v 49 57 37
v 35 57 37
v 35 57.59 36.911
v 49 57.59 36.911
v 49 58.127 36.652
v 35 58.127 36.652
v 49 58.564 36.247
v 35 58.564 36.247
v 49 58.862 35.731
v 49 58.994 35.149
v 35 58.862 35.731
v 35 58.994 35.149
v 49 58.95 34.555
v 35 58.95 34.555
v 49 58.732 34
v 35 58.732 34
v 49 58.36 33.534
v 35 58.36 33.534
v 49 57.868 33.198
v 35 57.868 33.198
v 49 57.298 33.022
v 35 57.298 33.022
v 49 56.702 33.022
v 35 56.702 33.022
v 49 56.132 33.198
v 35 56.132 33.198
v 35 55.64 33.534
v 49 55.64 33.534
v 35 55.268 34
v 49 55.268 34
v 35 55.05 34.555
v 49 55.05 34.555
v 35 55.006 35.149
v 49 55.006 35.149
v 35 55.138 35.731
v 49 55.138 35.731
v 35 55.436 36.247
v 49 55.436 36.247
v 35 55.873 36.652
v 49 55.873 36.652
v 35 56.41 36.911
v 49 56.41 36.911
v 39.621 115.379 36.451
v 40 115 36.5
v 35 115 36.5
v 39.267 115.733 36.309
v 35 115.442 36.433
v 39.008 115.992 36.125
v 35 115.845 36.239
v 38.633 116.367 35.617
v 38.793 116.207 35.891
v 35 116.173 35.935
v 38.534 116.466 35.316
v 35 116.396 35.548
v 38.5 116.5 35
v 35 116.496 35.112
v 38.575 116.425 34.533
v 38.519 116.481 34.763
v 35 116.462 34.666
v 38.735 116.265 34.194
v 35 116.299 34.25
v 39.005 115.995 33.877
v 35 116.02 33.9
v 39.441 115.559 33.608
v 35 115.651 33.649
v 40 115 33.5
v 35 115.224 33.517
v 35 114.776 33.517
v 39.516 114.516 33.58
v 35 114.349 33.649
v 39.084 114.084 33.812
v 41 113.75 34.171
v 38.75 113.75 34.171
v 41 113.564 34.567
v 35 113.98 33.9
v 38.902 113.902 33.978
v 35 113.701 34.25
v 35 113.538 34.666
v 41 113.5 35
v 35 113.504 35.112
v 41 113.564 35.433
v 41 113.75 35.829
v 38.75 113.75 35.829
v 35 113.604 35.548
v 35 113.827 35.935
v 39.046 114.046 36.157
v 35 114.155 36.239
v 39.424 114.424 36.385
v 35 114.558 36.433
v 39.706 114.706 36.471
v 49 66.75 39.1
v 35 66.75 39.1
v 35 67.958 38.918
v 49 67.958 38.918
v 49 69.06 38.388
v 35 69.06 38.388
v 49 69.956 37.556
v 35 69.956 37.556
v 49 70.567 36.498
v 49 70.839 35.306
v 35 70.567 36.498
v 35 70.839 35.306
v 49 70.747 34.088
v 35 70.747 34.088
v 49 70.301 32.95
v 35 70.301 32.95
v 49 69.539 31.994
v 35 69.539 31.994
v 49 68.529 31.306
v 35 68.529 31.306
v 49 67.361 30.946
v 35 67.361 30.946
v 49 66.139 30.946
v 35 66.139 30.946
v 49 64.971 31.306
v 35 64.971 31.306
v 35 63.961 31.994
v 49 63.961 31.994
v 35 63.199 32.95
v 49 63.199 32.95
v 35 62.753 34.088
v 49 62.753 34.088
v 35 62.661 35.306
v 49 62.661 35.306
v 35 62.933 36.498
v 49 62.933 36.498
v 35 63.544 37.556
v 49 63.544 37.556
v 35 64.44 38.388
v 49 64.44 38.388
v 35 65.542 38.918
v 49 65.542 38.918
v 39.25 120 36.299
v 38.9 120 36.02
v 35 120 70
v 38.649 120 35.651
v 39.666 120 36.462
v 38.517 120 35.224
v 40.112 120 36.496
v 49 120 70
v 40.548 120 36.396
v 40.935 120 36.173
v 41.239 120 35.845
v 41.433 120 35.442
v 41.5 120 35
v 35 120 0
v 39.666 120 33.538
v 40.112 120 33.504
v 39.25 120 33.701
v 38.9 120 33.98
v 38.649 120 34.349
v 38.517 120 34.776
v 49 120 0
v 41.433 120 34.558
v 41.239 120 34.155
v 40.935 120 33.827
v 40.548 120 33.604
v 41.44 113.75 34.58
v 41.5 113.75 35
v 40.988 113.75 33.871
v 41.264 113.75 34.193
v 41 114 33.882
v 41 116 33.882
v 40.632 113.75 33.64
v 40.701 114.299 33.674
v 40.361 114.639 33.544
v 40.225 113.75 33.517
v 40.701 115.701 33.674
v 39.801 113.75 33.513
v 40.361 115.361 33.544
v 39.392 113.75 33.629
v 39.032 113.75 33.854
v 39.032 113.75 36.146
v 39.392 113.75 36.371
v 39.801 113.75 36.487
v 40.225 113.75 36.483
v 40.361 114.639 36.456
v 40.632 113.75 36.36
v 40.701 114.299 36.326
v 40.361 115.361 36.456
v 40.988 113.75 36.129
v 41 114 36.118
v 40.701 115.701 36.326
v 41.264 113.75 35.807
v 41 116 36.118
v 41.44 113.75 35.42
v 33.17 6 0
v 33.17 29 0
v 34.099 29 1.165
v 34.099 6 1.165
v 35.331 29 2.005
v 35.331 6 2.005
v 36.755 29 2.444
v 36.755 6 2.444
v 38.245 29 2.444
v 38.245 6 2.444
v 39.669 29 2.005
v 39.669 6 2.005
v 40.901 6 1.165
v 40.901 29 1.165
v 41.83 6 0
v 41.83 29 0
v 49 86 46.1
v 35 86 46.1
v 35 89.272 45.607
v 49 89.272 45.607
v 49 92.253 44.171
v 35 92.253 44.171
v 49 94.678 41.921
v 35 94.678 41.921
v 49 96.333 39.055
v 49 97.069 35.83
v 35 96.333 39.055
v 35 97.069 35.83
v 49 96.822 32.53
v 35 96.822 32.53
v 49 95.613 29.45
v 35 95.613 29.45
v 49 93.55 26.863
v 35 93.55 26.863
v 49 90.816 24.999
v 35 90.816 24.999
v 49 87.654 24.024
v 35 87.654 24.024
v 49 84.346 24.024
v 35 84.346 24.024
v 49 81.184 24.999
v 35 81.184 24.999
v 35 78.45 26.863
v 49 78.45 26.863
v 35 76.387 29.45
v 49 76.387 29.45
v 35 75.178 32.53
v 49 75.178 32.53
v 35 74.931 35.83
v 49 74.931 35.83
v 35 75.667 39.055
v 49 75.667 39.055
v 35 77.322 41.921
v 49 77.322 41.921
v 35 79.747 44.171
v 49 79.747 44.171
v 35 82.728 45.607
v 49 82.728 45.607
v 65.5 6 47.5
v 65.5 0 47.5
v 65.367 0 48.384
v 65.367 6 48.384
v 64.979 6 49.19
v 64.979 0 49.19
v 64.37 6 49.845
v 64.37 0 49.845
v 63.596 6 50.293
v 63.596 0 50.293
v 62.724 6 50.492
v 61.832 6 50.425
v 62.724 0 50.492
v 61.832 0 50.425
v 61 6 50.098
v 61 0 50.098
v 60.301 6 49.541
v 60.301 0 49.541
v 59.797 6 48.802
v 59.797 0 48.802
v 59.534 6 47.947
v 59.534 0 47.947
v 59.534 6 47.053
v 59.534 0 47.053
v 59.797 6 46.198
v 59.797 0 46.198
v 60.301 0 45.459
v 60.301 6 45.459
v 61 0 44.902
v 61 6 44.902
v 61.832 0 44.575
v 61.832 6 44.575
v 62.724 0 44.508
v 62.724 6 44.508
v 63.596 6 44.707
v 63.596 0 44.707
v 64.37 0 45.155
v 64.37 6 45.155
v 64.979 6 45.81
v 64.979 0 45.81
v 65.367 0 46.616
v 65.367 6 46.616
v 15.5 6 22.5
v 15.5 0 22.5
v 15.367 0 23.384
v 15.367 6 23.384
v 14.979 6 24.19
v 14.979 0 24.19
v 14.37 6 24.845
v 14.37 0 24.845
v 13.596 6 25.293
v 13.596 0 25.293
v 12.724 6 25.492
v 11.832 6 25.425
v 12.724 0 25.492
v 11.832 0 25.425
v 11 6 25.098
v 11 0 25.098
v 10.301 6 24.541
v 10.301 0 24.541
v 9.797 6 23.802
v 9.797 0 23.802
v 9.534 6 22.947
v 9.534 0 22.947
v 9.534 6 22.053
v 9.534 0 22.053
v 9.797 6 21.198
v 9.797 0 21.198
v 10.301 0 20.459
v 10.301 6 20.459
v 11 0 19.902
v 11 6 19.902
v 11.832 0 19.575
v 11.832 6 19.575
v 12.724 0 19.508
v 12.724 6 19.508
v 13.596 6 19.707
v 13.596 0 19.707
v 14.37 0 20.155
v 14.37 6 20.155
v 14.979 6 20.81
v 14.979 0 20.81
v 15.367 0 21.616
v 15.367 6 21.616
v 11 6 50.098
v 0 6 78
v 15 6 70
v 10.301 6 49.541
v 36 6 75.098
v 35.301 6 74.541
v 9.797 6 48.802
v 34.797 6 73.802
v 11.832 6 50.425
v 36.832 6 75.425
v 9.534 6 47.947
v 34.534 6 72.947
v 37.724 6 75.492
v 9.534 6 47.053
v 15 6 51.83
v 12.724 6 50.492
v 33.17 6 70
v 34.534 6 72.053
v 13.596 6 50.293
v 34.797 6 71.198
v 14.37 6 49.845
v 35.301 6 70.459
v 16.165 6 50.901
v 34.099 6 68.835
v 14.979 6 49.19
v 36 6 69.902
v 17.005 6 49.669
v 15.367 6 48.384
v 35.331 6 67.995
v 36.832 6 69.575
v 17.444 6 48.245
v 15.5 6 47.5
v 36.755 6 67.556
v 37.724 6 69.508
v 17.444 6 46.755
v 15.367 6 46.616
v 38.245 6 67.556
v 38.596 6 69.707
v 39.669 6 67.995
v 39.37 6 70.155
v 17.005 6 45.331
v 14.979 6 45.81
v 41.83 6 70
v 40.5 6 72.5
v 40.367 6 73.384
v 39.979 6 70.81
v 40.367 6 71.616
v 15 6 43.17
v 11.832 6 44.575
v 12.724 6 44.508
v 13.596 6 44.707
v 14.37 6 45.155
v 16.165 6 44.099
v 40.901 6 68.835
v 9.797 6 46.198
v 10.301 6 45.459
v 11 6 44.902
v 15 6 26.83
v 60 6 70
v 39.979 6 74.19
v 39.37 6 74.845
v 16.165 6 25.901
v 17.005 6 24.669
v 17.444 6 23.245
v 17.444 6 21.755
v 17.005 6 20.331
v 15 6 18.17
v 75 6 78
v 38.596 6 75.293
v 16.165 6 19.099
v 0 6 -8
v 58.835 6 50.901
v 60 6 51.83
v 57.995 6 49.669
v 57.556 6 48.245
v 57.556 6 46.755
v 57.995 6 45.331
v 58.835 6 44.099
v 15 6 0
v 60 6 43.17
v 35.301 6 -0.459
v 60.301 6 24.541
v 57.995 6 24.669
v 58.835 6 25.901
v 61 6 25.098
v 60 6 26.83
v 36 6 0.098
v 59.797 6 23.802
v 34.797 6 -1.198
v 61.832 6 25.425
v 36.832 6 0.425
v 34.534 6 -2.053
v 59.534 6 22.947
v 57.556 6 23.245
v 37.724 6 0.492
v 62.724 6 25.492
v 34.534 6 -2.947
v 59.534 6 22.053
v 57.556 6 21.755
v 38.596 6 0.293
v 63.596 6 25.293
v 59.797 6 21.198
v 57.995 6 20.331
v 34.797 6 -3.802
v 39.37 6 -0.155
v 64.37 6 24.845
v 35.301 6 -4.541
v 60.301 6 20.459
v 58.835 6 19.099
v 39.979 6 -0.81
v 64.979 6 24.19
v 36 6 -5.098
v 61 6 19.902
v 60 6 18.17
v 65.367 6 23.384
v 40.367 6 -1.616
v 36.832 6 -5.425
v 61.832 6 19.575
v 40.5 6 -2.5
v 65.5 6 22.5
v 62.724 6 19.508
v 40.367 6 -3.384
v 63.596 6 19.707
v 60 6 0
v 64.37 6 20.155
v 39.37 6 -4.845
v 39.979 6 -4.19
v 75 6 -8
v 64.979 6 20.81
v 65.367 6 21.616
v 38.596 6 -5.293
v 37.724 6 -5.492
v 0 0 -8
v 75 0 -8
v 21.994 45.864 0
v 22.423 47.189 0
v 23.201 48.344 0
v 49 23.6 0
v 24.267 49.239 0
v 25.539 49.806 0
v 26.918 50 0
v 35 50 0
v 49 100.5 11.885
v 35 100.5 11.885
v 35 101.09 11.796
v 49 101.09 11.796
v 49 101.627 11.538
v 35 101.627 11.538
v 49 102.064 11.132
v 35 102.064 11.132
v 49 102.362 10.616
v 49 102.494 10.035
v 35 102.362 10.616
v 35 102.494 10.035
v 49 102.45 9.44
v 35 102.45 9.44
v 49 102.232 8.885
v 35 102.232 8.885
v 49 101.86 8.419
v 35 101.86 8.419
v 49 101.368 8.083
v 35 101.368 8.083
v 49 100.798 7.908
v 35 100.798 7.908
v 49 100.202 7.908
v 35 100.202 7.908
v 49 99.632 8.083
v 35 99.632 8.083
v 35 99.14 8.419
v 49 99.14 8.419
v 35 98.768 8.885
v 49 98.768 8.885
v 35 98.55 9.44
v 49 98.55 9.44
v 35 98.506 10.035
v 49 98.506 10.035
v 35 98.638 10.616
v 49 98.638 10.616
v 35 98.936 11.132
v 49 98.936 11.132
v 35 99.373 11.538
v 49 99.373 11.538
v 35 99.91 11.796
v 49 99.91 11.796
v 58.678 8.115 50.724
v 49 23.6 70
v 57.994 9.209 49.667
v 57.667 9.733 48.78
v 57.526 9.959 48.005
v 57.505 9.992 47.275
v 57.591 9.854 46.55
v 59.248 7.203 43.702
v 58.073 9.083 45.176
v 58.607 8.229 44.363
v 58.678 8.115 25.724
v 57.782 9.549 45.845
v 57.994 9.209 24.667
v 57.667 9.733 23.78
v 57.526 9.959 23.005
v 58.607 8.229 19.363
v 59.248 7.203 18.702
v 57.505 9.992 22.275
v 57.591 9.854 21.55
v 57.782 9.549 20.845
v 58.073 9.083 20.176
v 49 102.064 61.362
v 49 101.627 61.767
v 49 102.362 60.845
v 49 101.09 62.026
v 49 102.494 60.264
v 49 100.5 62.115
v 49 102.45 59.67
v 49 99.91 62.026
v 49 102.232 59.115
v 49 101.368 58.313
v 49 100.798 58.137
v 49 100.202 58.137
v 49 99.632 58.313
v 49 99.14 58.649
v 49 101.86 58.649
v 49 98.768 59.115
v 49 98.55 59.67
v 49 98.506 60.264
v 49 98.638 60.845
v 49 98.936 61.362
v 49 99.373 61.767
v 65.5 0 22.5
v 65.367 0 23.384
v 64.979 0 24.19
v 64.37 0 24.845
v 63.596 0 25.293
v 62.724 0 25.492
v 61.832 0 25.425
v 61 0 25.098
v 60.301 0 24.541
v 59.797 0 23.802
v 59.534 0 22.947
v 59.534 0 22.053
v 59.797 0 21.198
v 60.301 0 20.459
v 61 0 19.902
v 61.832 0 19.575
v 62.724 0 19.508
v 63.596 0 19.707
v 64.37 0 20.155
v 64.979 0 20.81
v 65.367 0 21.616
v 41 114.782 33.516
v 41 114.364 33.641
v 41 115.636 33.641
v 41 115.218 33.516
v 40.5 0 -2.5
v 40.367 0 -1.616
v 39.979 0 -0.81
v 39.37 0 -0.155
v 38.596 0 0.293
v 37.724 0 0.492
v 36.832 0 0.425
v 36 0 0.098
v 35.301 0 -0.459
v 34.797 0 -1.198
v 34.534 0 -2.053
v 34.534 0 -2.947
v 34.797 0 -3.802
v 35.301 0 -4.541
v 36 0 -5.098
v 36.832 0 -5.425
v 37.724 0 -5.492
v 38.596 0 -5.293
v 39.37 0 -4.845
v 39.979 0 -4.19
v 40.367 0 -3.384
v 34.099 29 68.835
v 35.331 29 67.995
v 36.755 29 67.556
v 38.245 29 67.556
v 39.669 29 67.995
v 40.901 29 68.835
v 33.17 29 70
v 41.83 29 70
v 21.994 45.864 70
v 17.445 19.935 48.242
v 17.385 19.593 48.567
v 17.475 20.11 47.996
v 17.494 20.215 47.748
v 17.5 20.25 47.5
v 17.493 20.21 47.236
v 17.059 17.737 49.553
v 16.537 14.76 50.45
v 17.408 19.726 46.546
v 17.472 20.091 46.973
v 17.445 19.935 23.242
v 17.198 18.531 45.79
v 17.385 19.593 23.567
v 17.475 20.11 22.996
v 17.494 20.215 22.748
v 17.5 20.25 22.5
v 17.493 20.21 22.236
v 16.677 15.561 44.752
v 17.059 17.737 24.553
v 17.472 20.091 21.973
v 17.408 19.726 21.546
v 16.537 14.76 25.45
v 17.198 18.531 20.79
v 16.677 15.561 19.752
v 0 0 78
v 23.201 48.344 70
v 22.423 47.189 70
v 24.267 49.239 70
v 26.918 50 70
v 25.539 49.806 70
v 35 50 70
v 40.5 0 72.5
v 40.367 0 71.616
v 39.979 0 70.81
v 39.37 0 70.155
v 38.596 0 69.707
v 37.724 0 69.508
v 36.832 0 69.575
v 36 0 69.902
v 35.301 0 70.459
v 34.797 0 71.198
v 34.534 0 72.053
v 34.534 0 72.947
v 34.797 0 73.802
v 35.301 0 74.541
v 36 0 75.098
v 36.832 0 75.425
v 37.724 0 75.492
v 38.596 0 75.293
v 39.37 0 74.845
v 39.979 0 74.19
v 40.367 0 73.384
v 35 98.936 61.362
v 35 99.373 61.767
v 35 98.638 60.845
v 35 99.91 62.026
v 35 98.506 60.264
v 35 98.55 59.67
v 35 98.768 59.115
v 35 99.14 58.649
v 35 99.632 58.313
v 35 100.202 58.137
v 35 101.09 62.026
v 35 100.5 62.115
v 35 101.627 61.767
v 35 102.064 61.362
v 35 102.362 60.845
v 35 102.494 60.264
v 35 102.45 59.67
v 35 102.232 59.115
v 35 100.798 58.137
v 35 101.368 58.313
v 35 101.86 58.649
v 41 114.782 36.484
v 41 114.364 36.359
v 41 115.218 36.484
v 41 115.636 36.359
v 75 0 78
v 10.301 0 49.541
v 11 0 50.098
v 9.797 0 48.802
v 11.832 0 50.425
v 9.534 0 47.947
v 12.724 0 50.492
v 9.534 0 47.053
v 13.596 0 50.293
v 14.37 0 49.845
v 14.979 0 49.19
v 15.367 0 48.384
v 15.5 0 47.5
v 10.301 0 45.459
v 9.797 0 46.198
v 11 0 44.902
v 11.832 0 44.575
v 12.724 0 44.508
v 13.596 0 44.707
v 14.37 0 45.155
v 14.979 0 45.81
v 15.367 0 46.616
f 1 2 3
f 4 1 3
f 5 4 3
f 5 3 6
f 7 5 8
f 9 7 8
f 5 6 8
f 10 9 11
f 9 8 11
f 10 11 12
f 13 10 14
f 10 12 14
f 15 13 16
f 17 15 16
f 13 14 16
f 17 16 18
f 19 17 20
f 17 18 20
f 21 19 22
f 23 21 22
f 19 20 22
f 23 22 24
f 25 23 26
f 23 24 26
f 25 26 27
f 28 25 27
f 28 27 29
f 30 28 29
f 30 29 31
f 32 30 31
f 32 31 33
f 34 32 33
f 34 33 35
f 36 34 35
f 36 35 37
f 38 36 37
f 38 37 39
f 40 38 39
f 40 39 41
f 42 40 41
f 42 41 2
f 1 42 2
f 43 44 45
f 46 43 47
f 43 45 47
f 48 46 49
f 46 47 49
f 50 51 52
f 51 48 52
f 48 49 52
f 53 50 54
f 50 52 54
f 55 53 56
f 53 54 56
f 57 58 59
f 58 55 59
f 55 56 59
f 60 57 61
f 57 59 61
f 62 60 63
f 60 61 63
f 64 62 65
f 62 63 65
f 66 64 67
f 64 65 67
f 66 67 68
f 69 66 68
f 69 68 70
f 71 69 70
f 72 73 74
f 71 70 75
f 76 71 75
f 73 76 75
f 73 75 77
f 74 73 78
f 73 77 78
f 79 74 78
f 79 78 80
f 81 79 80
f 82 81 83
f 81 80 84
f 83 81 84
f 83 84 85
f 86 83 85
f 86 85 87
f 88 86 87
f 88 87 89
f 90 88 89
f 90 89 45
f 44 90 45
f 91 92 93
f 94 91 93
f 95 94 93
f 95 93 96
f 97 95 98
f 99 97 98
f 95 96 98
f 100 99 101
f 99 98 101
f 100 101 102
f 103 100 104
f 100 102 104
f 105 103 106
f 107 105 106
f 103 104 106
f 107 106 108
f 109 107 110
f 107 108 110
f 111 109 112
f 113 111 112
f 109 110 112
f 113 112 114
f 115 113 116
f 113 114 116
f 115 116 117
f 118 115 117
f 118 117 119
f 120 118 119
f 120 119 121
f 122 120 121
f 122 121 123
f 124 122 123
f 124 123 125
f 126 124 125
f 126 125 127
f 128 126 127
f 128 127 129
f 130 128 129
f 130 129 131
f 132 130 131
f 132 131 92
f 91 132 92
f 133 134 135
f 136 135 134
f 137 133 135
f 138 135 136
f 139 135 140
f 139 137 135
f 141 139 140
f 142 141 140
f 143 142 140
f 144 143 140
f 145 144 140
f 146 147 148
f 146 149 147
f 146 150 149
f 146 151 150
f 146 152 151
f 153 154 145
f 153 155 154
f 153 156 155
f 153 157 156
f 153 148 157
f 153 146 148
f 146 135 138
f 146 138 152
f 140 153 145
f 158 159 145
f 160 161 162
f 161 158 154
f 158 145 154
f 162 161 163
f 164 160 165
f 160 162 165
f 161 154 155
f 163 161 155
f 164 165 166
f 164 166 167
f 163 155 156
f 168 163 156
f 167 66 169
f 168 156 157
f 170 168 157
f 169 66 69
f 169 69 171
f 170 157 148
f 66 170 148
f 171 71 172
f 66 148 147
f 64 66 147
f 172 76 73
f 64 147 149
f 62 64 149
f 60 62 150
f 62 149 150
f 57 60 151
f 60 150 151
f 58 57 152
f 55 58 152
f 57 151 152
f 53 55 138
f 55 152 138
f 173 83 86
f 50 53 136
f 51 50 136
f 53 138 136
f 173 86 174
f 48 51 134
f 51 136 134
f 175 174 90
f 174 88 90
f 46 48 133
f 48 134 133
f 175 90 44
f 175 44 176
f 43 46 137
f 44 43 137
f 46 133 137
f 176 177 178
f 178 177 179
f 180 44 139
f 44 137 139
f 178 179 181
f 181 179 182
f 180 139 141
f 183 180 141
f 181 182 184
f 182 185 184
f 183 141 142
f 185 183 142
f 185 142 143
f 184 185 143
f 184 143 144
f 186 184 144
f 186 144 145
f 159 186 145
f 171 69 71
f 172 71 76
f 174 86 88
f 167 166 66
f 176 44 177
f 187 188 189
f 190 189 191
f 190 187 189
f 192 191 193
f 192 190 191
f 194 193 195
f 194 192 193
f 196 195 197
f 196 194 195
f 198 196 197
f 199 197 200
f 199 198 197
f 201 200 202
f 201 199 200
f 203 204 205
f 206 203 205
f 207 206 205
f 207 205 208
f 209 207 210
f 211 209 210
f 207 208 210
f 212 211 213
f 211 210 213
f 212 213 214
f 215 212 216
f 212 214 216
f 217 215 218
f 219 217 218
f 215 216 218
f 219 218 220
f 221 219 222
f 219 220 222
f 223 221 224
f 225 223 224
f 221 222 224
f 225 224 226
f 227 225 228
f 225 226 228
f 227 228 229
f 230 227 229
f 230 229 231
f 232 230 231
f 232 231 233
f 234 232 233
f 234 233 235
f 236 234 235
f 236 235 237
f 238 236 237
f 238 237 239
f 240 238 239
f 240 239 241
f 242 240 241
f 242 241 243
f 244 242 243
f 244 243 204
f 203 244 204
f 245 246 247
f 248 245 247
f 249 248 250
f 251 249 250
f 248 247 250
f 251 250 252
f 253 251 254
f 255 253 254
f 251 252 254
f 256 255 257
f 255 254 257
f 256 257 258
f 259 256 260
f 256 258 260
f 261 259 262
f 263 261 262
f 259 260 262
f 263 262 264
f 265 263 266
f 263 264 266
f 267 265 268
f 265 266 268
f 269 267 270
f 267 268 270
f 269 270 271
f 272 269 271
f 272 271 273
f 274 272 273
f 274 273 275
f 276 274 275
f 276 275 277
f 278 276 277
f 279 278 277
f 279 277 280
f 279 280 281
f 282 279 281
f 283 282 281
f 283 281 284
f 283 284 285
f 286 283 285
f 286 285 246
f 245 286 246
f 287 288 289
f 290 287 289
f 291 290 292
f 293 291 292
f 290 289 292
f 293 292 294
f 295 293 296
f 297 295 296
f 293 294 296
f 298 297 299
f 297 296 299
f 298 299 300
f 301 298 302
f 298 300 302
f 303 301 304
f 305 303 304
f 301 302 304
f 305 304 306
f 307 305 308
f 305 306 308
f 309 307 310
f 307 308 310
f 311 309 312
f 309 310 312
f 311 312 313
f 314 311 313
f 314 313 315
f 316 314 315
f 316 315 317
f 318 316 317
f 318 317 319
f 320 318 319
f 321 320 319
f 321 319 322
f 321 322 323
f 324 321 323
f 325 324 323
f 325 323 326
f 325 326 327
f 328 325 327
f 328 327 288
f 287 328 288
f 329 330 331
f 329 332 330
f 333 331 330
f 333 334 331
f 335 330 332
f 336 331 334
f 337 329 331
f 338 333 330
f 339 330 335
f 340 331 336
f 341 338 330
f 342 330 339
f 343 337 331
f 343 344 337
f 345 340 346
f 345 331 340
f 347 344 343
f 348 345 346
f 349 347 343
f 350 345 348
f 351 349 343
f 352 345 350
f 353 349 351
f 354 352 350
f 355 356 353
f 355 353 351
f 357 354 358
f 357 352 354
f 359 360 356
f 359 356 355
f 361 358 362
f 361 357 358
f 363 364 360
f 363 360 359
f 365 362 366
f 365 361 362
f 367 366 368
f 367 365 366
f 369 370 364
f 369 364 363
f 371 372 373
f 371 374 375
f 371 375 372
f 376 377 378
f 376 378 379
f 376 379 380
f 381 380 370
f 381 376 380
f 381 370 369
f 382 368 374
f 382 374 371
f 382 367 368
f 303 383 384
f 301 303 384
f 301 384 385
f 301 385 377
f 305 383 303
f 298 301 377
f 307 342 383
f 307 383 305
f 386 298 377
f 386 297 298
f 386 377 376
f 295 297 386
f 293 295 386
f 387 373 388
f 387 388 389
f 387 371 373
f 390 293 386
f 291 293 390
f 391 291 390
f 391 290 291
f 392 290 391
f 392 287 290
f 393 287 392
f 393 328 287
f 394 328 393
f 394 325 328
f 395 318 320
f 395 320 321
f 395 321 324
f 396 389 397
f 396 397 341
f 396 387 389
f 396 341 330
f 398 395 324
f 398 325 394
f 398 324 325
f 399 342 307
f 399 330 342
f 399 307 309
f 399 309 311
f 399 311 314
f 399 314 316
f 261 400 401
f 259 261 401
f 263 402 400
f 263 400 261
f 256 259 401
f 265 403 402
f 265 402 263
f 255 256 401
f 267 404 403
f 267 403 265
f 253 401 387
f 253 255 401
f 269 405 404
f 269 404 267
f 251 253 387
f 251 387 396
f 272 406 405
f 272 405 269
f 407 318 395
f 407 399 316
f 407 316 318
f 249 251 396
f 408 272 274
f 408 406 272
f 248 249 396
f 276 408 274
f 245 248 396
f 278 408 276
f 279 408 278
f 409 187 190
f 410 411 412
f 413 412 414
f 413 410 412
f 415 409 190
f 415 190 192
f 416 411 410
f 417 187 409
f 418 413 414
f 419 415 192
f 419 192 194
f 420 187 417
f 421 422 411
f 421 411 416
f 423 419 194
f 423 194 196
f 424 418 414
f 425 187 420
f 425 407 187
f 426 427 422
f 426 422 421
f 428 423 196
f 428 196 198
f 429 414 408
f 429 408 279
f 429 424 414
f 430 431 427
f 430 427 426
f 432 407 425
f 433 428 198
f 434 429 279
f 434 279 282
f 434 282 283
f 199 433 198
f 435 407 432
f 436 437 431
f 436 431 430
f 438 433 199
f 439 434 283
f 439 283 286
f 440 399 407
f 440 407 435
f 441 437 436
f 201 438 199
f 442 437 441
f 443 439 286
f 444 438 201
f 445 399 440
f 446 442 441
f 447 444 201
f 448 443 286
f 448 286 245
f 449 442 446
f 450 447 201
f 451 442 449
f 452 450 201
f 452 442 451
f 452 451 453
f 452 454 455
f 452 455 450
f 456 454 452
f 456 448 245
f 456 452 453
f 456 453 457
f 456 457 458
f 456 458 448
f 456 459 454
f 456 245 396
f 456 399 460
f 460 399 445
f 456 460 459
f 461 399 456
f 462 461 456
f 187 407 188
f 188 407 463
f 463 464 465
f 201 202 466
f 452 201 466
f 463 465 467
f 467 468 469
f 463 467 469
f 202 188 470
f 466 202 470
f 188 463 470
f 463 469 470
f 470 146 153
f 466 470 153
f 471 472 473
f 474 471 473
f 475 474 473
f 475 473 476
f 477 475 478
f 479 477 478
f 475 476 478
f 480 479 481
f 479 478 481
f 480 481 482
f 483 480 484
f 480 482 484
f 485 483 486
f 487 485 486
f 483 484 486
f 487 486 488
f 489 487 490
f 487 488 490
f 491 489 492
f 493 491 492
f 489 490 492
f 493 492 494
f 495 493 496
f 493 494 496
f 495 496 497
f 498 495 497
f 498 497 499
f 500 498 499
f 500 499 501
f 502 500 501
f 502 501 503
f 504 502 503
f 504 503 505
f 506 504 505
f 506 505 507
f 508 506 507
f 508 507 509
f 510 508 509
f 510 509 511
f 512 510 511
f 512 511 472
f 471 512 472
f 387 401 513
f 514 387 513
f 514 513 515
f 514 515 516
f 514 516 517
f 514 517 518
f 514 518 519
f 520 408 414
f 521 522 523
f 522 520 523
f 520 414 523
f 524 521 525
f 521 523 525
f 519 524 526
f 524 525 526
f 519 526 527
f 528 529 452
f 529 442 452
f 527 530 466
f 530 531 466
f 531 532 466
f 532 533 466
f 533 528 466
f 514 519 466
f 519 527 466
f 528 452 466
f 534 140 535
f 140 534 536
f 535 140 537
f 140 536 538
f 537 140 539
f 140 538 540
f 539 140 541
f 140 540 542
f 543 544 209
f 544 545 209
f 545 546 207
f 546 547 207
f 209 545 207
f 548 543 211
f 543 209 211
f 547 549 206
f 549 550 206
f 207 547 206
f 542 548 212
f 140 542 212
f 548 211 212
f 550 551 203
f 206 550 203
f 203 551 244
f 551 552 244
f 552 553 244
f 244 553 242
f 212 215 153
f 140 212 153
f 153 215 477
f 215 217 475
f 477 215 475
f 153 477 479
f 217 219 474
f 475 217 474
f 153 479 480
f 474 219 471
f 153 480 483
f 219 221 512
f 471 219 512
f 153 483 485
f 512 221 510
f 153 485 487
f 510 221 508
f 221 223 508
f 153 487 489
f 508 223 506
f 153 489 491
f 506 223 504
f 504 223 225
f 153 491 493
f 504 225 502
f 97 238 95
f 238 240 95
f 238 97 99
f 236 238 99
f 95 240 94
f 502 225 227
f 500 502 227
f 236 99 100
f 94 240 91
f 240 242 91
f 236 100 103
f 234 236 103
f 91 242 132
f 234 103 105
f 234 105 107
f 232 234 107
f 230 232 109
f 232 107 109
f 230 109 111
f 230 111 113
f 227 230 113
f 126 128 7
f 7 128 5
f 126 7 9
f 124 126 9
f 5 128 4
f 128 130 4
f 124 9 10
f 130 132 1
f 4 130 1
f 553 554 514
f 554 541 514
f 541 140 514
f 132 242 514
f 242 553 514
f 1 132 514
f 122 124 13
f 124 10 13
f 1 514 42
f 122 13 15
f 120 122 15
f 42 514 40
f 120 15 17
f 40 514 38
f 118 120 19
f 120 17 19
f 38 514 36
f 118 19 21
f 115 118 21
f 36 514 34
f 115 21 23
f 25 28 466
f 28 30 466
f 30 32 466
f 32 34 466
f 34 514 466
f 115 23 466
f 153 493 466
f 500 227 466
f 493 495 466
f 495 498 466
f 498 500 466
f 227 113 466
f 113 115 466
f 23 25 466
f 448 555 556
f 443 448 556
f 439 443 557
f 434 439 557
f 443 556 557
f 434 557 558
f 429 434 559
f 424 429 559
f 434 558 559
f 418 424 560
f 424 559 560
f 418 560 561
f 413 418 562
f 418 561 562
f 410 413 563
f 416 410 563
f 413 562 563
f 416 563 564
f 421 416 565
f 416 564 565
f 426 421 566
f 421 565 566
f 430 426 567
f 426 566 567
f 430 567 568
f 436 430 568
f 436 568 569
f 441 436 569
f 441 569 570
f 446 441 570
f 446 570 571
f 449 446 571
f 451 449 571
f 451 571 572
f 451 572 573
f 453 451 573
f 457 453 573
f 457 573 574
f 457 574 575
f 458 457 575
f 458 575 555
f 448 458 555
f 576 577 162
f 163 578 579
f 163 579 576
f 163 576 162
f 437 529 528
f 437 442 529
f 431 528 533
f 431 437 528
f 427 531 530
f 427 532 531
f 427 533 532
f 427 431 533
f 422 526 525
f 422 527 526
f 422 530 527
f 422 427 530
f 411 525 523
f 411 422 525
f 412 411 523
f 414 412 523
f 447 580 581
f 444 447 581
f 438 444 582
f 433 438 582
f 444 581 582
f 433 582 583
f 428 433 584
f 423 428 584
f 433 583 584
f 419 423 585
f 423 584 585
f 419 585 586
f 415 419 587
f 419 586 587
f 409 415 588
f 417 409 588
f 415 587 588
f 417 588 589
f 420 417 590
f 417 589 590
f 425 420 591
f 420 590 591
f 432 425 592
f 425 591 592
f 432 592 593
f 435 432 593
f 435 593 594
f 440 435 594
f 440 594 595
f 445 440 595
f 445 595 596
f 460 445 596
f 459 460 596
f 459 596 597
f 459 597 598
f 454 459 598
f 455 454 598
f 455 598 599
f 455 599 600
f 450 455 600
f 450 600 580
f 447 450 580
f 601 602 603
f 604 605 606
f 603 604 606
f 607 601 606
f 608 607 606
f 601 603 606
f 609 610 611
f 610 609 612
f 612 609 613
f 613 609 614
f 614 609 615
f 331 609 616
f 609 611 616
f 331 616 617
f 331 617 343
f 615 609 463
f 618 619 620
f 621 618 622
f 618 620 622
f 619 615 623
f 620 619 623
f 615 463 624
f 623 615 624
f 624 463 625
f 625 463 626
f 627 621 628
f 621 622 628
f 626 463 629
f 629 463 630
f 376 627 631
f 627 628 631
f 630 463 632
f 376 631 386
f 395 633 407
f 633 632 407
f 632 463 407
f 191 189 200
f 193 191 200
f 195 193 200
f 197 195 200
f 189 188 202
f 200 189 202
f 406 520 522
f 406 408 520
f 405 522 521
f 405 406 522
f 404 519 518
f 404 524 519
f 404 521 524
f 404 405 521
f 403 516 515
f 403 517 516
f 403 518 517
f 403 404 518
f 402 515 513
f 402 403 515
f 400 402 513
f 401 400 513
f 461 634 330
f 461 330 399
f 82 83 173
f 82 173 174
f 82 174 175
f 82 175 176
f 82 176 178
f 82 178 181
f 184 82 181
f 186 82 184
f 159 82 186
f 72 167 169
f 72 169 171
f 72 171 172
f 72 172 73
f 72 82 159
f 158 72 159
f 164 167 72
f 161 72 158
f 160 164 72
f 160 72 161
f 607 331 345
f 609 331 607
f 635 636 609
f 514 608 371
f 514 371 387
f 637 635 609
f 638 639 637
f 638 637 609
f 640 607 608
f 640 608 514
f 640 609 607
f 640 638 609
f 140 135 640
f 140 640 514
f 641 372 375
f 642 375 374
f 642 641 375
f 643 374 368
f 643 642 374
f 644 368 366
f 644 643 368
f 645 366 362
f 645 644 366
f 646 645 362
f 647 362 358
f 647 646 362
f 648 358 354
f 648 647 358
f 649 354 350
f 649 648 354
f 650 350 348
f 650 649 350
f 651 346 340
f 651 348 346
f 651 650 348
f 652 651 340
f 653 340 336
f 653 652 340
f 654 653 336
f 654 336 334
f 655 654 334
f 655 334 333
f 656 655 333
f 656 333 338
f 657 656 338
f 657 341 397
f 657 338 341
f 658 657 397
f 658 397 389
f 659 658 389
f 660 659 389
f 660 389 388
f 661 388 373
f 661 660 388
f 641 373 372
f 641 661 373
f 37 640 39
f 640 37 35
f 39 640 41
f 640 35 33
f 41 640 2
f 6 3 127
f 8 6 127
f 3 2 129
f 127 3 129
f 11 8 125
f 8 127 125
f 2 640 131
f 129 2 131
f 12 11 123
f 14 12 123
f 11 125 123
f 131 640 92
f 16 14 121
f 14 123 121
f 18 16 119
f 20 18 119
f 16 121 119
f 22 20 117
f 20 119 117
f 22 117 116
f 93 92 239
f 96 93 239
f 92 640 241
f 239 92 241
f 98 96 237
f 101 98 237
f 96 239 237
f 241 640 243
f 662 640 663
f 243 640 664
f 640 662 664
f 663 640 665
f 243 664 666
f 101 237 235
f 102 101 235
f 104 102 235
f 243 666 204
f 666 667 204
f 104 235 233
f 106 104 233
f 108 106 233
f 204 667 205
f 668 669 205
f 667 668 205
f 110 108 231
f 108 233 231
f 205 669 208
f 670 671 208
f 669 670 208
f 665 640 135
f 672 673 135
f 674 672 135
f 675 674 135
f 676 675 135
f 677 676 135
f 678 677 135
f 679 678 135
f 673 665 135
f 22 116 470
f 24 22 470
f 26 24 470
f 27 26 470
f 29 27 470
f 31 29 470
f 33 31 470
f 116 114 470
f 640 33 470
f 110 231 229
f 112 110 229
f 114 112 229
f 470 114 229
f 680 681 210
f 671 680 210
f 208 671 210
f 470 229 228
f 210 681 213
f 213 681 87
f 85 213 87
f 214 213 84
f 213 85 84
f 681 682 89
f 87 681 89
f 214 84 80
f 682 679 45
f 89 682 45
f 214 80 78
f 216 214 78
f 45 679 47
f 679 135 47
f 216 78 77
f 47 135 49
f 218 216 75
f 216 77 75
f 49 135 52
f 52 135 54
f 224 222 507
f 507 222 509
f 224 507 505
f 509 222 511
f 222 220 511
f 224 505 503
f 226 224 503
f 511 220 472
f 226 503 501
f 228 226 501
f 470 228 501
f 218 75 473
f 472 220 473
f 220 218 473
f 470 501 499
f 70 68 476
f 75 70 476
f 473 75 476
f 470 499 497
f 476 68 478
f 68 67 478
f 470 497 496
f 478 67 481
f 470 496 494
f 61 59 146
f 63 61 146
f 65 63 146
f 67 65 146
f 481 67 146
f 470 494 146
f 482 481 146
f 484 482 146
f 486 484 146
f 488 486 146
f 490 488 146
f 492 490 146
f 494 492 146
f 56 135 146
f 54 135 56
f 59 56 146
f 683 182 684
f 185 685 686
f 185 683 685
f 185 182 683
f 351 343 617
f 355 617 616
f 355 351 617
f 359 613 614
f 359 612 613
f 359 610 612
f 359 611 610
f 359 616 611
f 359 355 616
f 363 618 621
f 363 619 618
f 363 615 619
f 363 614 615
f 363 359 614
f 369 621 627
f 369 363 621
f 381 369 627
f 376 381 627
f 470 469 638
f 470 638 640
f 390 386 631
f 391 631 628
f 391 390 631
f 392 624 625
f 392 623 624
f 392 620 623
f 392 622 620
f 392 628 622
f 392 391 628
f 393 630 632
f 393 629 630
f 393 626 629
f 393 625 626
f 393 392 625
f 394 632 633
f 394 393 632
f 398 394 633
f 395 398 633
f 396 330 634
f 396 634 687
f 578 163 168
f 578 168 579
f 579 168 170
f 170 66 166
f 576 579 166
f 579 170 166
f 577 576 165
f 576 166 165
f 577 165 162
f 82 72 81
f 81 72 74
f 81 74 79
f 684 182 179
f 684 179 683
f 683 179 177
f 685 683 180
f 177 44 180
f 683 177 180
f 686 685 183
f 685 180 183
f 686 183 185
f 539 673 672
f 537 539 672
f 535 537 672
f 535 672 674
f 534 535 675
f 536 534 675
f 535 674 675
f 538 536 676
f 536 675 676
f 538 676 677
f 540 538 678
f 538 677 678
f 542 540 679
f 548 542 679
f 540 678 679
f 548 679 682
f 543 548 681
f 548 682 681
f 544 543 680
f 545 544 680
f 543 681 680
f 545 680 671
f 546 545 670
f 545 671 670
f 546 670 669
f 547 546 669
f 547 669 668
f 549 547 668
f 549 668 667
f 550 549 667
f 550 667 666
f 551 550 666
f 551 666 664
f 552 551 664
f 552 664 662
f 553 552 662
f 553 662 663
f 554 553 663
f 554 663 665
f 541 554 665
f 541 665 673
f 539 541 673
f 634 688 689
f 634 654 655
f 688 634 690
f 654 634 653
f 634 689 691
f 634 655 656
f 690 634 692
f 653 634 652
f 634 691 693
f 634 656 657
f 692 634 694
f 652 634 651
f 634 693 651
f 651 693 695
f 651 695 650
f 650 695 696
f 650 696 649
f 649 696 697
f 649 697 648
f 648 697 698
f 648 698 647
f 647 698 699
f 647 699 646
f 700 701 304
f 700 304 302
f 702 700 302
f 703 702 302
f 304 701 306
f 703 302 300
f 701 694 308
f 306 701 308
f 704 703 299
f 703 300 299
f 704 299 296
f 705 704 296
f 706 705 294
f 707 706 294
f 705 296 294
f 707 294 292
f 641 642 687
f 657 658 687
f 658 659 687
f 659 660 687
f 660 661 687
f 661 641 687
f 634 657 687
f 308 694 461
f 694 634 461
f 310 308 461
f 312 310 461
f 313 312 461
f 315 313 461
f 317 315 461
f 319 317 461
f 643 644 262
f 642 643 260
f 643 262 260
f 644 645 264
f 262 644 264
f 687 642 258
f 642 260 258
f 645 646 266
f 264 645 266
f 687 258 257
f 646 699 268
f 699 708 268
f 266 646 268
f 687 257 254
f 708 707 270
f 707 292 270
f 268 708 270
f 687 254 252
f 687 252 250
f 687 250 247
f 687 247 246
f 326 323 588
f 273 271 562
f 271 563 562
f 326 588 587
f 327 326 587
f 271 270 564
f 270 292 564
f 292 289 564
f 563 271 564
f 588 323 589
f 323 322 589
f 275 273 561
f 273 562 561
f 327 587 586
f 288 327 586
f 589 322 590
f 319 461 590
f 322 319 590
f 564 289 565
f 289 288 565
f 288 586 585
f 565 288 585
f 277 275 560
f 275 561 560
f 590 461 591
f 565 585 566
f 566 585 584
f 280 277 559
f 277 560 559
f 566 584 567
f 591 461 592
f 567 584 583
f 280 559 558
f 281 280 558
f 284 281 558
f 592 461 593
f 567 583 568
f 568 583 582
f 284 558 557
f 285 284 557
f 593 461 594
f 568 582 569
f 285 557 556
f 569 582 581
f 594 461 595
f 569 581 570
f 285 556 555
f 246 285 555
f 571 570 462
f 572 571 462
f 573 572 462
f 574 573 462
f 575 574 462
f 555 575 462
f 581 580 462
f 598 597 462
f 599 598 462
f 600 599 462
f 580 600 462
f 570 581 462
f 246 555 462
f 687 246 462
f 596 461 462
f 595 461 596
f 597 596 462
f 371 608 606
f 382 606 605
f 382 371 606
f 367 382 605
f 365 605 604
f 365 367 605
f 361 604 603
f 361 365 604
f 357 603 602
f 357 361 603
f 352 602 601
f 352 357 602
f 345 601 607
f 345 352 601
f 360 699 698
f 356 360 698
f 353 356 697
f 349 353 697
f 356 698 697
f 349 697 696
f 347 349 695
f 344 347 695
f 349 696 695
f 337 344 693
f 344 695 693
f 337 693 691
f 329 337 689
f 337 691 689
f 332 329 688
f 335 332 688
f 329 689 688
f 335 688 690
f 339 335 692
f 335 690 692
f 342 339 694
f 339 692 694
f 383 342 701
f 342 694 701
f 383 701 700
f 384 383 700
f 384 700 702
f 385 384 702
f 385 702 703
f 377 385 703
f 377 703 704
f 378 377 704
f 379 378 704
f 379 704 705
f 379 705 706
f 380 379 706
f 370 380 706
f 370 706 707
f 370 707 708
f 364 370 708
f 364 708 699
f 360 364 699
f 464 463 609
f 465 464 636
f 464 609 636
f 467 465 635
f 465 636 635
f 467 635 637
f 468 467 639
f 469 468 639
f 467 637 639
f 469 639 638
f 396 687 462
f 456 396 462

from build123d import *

# Parameters (mm, degrees)
SKETCH_1_W               = 35
SKETCH_1_H               = 70
EXTRUDE_1_DEPTH          = 6
SKETCH_1_W_2             = 26
EXTRUDE_1_2_DEPTH        = 6
SKETCH_1_3_W             = 14
SKETCH_1_3_H             = 70
EXTRUDE_2_DEPTH          = 120
EXTRUDE_4_DEPTH          = 70
EXTRUDE_7_DEPTH          = 70
SKETCH_7_R               = 3
CUT_EXTRUDE_4_DEPTH      = 121
SKETCH_8_R               = 5
CUT_EXTRUDE_5_DEPTH      = 115
SKETCH_3_R               = 11.1
SKETCH_3_R_2             = 4.1
SKETCH_3_R_3             = 2
CUT_EXTRUDE_8_DEPTH      = 36
CUT_EXTRUDE_8_DEPTH_BACK = 41
SKETCH_10_W              = 75
SKETCH_10_H              = 24
EXTRUDE_8_DEPTH          = 6
CUT_EXTRUDE_START        = -6
SKETCH_11_R              = 3
CUT_EXTRUDE_9_DEPTH      = 29
SKETCH_12_W              = 56.46589335
SKETCH_12_H              = 70
CUT_EXTRUDE_10_DEPTH     = 70
FILLET_1_R               = 5
SKETCH_13_R              = 5
CUT_EXTRUDE_11_DEPTH     = 23
SKETCH_14_W              = 75
SKETCH_14_H              = 16
CUT_EXTRUDE_12_DEPTH     = 10
SKETCH_15_R              = 1.5
CUT_EXTRUDE_13_DEPTH     = 6.25
SKETCH_16_R              = 1.5
CUT_EXTRUDE_14_DEPTH     = 6


with BuildPart() as part:
    # 草图1 → 凸台-拉伸1 (new body)
    with BuildSketch(Plane(origin=(0, 0, 0), x_dir=(1, 0, 0), z_dir=(0, 1, 0))):
        with Locations((17.5, -35)):
            Rectangle(SKETCH_1_W, SKETCH_1_H)
    extrude(amount=EXTRUDE_1_DEPTH)



with BuildPart() as body_2:
    # 草图1 → Extrude 1 2 (new body)
    with BuildSketch(Plane(origin=(0, 0, 0), x_dir=(1, 0, 0), z_dir=(0, 1, 0))):
        with Locations((62, -35)):
            Rectangle(SKETCH_1_W_2, SKETCH_1_H)
    extrude(amount=EXTRUDE_1_2_DEPTH)


with BuildPart() as part_1:
    add(part.part)

    add(body_2.part)  # 凸台-拉伸2 merges body 2
    # 草图1<3> → 凸台-拉伸2 (add)
    with BuildSketch(Plane(origin=(0, 0, 0), x_dir=(1, 0, 0), z_dir=(0, 1, 0))):
        with Locations((42, -35)):
            Rectangle(SKETCH_1_3_W, SKETCH_1_3_H)
    extrude(amount=EXTRUDE_2_DEPTH)

    # 草图4 → 凸台-拉伸4 (add, through all)
    with BuildSketch(Plane(origin=(0, 0, 0), x_dir=(-1, 0, 0), z_dir=(0, 0, -1))):
        Polygon((-35, 6), (-15, 6), (-35, 38), align=None)
        Polygon((-60, 6), (-40, 38), (-40, 6), align=None)
    extrude(amount=-EXTRUDE_4_DEPTH)

    # 草图9 → 凸台-拉伸7 (add, through all)
    with BuildSketch(Plane(origin=(0, 0, 0), x_dir=(-1, 0, 0), z_dir=(0, 0, -1))):
        Polygon((-35, 120), (-15, 6), (-35, 0), align=None)
    extrude(amount=-EXTRUDE_7_DEPTH)

    # 草图7 → 切除-拉伸4 (cut, through all)
    with BuildSketch(Plane.XZ):
        with Locations((62.5, 47.5)):
            Circle(SKETCH_7_R)
        with Locations((62.5, 22.5)):
            Circle(SKETCH_7_R)
        with Locations((12.5, 22.5)):
            Circle(SKETCH_7_R)
        with Locations((12.5, 47.5)):
            Circle(SKETCH_7_R)
    extrude(amount=-CUT_EXTRUDE_4_DEPTH, mode=Mode.SUBTRACT)

    # 草图8 → 切除-拉伸5 (cut)
    with BuildSketch(Plane(origin=(0, 6, 0), x_dir=(1, 0, 0), z_dir=(0, 1, 0))):
        with Locations((12.5, -47.5)):
            Circle(SKETCH_8_R)
        with Locations((12.5, -22.5)):
            Circle(SKETCH_8_R)
        with Locations((62.5, -47.5)):
            Circle(SKETCH_8_R)
        with Locations((62.5, -22.5)):
            Circle(SKETCH_8_R)
    extrude(amount=CUT_EXTRUDE_5_DEPTH, mode=Mode.SUBTRACT)

    # 草图3 → 切除-拉伸8 (cut, two sides)
    with BuildSketch(Plane.ZY.offset(-35)) as cut_extrude_8_sk:
        with Locations((35, 86)):
            Circle(SKETCH_3_R)
        with Locations((35, 66.75)):
            Circle(SKETCH_3_R_2)
        with Locations((35, 57)):
            Circle(SKETCH_3_R_3)
        with Locations((9.88526329, 100.5)):
            Circle(SKETCH_3_R_3)
        with Locations((60.11473671, 100.5)):
            Circle(SKETCH_3_R_3)
    extrude(amount=CUT_EXTRUDE_8_DEPTH, mode=Mode.SUBTRACT)
    extrude(cut_extrude_8_sk.sketch, amount=-CUT_EXTRUDE_8_DEPTH_BACK, mode=Mode.SUBTRACT)

    # 草图10 → 凸台-拉伸8 (add)
    with BuildSketch(Plane.XZ):
        with Locations((37.5, 82)):
            Rectangle(SKETCH_10_W, SKETCH_10_H)
    extrude_8 = extrude(amount=-EXTRUDE_8_DEPTH)

    # 草图11 → 切除-拉伸9 (cut)
    with BuildSketch(Plane(origin=(0, 6, 0), x_dir=(1, 0, 0), z_dir=(0, 1, 0)).offset(CUT_EXTRUDE_START)):
        with Locations((37.5, -72.5)):
            Circle(SKETCH_11_R)
    cut_extrude_9 = extrude(amount=CUT_EXTRUDE_9_DEPTH, mode=Mode.SUBTRACT)

    # 镜向1: 凸台-拉伸8, 切除-拉伸9 across plane
    add(extrude_8.mirror(Plane.XY.offset(35)))
    add(cut_extrude_9.mirror(Plane.XY.offset(35)), mode=Mode.SUBTRACT)

    # 草图12 → 切除-拉伸10 (cut)
    with BuildSketch(Plane(origin=(0, 120, 0), x_dir=(1, 0, 0), z_dir=(0, 1, 0))):
        with Locations((6.767053325, -35)):
            Rectangle(SKETCH_12_W, SKETCH_12_H)
    extrude(amount=-CUT_EXTRUDE_10_DEPTH, mode=Mode.SUBTRACT)

    # 圆角1
    fillet_1_edges = [part_1.edges().sort_by_distance(p)[0] for p in [
        (22.719298246, 50, 35),
    ]]
    fillet(fillet_1_edges, radius=FILLET_1_R)

    # 草图13 → 切除-拉伸11 (cut)
    with BuildSketch(Plane(origin=(0, 6, 0), x_dir=(1, 0, 0), z_dir=(0, 1, 0))):
        with Locations((37.5, -72.5)):
            Circle(SKETCH_13_R)
        with Locations((37.5, 2.5)):
            Circle(SKETCH_13_R)
    extrude(amount=CUT_EXTRUDE_11_DEPTH, mode=Mode.SUBTRACT)

    # 草图14 → 切除-拉伸12 (cut)
    with BuildSketch(Plane(origin=(0, 6, 0), x_dir=(1, 0, 0), z_dir=(0, 1, 0))):
        with Locations((37.5, 16)):
            Rectangle(SKETCH_14_W, SKETCH_14_H)
        with Locations((37.5, -86)):
            Rectangle(SKETCH_14_W, SKETCH_14_H)
    extrude(amount=-CUT_EXTRUDE_12_DEPTH, mode=Mode.SUBTRACT)

    # 草图15 → 切除-拉伸13 (cut)
    with BuildSketch(Plane(origin=(0, 120, 0), x_dir=(1, 0, 0), z_dir=(0, 1, 0))):
        with Locations((40, -35)):
            Circle(SKETCH_15_R)
    extrude(amount=-CUT_EXTRUDE_13_DEPTH, mode=Mode.SUBTRACT)

    # 草图16 → 切除-拉伸14 (cut)
    with BuildSketch(Plane.ZY.offset(-35)):
        with Locations((35, 115)):
            Circle(SKETCH_16_R)
    extrude(amount=-CUT_EXTRUDE_14_DEPTH, mode=Mode.SUBTRACT)


solid = part_1.part
